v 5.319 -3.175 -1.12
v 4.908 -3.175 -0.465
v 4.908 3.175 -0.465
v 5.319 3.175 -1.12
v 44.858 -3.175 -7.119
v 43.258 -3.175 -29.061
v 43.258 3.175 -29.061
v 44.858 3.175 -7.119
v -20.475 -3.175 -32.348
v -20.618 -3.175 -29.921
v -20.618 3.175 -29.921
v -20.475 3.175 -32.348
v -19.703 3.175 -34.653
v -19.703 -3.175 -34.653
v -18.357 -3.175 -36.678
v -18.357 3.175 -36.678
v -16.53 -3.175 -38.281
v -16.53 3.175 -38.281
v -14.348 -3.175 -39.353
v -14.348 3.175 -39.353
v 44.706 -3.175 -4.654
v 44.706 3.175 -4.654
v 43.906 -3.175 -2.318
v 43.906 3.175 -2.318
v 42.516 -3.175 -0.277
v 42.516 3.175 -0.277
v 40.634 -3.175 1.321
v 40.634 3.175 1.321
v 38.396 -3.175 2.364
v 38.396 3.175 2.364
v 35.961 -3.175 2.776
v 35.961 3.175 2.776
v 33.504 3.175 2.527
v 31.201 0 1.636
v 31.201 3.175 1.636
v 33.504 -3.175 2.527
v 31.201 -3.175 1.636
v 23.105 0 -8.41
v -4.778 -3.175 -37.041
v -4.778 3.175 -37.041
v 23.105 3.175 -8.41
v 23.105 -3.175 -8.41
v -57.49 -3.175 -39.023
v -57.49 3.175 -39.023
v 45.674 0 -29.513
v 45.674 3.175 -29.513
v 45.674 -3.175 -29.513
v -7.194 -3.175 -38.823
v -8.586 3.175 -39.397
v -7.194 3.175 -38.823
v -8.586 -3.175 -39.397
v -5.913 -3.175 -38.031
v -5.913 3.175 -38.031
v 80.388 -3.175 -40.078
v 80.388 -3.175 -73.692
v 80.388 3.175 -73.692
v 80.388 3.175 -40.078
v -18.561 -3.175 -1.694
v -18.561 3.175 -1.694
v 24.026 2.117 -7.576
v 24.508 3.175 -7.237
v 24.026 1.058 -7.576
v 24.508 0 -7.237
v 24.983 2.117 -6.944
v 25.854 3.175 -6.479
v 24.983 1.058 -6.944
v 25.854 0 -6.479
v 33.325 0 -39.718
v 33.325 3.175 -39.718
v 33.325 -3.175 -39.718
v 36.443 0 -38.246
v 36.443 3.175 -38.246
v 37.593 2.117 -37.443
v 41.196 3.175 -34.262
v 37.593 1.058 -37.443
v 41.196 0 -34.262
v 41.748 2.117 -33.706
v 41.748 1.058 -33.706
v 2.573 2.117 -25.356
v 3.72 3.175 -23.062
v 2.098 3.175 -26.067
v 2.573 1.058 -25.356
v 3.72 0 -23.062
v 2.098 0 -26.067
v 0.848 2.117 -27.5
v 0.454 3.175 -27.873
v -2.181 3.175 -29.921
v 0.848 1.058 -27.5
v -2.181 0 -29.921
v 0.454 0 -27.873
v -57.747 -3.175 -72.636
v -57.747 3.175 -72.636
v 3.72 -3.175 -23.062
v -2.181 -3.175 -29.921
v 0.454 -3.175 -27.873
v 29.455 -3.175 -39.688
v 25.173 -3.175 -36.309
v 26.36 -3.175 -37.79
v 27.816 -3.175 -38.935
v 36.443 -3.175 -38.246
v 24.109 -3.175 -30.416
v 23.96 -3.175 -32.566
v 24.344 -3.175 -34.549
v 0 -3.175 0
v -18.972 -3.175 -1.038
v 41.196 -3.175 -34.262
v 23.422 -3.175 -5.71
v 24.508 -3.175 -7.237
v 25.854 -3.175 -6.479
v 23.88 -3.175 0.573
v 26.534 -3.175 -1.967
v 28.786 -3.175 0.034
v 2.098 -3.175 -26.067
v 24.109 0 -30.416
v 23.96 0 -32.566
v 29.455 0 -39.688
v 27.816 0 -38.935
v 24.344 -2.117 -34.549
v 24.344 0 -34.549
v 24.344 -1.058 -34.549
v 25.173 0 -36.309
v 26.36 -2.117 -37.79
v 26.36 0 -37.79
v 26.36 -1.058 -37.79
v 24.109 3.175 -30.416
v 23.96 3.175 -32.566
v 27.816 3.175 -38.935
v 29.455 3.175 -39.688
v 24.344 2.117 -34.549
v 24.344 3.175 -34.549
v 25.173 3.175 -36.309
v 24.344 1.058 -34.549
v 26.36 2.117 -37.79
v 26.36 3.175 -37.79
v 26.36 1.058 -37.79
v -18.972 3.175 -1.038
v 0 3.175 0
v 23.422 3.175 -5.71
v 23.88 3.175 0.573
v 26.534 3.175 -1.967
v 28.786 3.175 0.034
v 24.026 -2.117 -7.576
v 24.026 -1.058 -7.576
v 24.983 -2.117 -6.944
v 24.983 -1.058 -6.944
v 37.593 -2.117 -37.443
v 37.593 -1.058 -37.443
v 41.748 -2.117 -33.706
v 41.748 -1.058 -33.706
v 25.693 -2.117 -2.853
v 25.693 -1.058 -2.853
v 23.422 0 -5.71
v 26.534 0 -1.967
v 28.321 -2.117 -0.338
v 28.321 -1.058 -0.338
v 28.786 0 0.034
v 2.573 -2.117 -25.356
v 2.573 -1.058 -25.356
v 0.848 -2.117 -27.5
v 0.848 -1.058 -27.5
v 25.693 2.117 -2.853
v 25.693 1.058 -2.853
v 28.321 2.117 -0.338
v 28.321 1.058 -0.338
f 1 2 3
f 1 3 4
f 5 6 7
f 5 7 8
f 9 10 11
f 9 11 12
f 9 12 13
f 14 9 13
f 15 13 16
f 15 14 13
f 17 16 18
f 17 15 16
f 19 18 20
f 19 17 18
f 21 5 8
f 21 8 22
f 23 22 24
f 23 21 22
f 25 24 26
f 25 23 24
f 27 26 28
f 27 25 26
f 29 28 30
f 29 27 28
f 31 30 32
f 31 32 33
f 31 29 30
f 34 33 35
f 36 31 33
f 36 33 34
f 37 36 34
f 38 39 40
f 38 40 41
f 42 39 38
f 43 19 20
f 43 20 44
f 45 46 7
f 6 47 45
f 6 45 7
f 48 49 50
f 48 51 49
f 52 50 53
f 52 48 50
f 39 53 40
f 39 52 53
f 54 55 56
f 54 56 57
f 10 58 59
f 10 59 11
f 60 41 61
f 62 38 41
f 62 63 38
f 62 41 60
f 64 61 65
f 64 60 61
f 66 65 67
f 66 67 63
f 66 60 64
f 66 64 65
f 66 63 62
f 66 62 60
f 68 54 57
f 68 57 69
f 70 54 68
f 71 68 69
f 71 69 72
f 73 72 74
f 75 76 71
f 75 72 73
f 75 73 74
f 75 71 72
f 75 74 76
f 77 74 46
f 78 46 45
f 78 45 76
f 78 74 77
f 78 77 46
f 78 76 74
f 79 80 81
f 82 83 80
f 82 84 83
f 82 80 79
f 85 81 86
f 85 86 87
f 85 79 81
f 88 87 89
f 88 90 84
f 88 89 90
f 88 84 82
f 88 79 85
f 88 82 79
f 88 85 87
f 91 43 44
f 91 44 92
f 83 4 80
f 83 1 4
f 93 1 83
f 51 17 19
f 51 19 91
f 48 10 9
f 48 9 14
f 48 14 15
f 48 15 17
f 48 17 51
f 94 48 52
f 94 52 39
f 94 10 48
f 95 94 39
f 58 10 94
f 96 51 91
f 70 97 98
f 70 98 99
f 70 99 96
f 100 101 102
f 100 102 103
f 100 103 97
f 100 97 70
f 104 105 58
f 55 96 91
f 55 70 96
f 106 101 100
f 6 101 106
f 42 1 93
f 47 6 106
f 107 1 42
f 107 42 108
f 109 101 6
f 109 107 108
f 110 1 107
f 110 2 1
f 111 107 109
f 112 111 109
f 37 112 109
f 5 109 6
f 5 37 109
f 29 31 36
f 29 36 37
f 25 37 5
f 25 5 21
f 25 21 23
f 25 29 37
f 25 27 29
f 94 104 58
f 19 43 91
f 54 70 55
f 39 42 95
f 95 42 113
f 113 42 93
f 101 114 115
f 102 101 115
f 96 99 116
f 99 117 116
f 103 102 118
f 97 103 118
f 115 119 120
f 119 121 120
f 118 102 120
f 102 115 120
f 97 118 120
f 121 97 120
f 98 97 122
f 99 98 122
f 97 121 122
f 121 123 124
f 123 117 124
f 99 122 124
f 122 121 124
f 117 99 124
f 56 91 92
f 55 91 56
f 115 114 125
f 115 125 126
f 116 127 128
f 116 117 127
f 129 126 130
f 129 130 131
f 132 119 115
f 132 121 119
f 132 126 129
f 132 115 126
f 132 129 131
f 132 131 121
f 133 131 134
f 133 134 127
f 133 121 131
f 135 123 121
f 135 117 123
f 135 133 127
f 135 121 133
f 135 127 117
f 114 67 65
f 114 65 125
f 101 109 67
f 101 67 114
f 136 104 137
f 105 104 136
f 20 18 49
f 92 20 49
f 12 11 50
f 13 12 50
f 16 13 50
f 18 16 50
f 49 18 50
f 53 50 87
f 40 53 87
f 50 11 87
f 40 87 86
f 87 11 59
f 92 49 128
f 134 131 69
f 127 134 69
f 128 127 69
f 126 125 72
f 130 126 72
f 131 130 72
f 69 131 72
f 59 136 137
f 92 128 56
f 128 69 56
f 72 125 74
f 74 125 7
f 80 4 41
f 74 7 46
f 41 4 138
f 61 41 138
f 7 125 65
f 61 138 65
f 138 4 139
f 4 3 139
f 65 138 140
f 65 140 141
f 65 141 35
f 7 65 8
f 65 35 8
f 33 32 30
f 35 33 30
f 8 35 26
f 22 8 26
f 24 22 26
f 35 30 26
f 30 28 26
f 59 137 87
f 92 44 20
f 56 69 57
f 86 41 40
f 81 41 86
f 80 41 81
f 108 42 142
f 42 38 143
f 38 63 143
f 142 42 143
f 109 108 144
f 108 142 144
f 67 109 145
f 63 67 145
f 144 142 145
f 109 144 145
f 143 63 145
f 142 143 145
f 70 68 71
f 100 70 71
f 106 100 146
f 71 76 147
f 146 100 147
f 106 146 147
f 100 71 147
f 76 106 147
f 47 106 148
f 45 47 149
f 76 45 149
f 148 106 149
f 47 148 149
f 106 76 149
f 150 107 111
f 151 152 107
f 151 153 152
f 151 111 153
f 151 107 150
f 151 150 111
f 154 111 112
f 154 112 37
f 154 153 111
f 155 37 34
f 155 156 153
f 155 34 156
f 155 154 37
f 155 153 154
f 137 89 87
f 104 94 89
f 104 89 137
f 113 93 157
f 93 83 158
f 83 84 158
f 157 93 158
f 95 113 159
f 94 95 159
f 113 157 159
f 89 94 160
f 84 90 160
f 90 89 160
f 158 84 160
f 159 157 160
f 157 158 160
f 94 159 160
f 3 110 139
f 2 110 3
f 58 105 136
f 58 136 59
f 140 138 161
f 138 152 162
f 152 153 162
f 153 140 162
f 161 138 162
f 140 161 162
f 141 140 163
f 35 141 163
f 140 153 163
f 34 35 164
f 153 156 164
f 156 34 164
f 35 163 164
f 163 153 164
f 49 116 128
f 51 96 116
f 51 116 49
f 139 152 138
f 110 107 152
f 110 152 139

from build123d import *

# Parameters (mm, degrees)
F1_DEPTH = 3.175


with BuildPart() as f1:
    # F0 (on Front) → F1 (new body, symmetric)
    with BuildSketch(Plane.XZ):
        with BuildLine():
            Line((-2.1811367593, -29.9206056496), (0, 0))
            Line((0, 0), (-18.9716252415, -1.0379959996))
            Line((-18.9716252415, -1.0379959996), (-18.560718745, -1.6936484026))
            Line((-18.560718745, -1.6936484026), (-20.6183928033, -29.9206056496))
            ThreePointArc((-20.6183928033, -29.9206056496), (-19.097069056, -35.7098670599), (-14.3476168276, -39.3530356194))
            Line((-14.3476168276, -39.3530356194), (-8.5862497906, -39.3970988002))
            ThreePointArc((-8.5862497906, -39.3970988002), (-6.5372712865, -38.4533368755), (-4.7779318284, -37.0413439039))
            Line((-4.7779318284, -37.0413439039), (23.1049112899, -8.4100140946))
            add(Edge.make_bspline(
                [(23.1049112899, -8.4100140946), (23.9660870284, -7.4624572881), (25.0680023001, -6.8722019142), (25.8537740575, -6.4793160355)],
                knots=[0, 0, 0, 0, 3.3591429725, 3.3591429725, 3.3591429725, 3.3591429725], degree=3))
            Line((25.8537740575, -6.4793160355), (24.10886465, -30.4158005552))
            add(Edge.make_bspline(
                [(24.10886465, -30.4158005552), (23.221265172, -34.8448709212), (26.0528829358, -38.6121878233), (29.4550270257, -39.6880401081)],
                knots=[0, 0, 0, 0, 0.386502628, 0.386502628, 0.386502628, 0.386502628], degree=3))
            Line((29.4550270257, -39.6880401081), (33.3250212912, -39.7176379893))
            add(Edge.make_bspline(
                [(33.3250212912, -39.7176379893), (37.6104290116, -38.509658395), (41.9014469905, -33.599334096), (45.6744432449, -29.5126028359)],
                knots=[0.529238247, 0.529238247, 0.529238247, 0.529238247, 1, 1, 1, 1], degree=3))
            Line((45.6744432449, -29.5126028359), (43.2580737253, -29.0605745563))
            Line((43.2580737253, -29.0605745563), (44.8575740155, -7.1187970799))
            ThreePointArc((44.8575740155, -7.1187970799), (40.634142354, 1.3214875027), (31.2014035881, 1.6364767216))
            add(Edge.make_bspline(
                [(23.4220137692, -5.7100140946), (25.4793688655, -2.7494623791), (28.2295402139, 0), (31.2014035881, 1.6364767216)],
                knots=[0, 0, 0, 0, 10.6999922087, 10.6999922087, 10.6999922087, 10.6999922087], degree=3))
            Line((23.4220137692, -5.7100140946), (23.8800524886, 0.5733130918))
            Line((23.8800524886, 0.5733130918), (4.9084272471, -0.4646829078))
            Line((4.9084272471, -0.4646829078), (5.3193337437, -1.1203353108))
            Line((5.3193337437, -1.1203353108), (3.7198334535, -23.0621127871))
            add(Edge.make_bspline(
                [(3.7198334535, -23.0621127871), (2.6201102883, -25.5734715611), (1.7430323642, -27.2203981876), (-2.1811367593, -29.9206056496)],
                knots=[0, 0, 0, 0, 9.0476722861, 9.0476722861, 9.0476722861, 9.0476722861], degree=3))
        make_face()
        with BuildLine():
            Line((-8.5862497906, -39.3970988002), (-14.3476168276, -39.3530356194))
            ThreePointArc((-14.3476168276, -39.3530356194), (-11.4704542579, -39.8354397482), (-8.5862497906, -39.3970988002))
        make_face()
        with BuildLine():
            Line((33.3250212912, -39.7176379893), (29.4550270257, -39.6880401081))
            add(Edge.make_bspline(
                [(29.4550270257, -39.6880401081), (30.0021087518, -39.8610425176), (31.2924032253, -40.0985217153), (32.5914536336, -39.9244175584), (33.3250212912, -39.7176379893)],
                knots=[0.386502628, 0.386502628, 0.386502628, 0.386502628, 0.4486541769, 0.529238247, 0.529238247, 0.529238247, 0.529238247], degree=3))
        make_face()
        with BuildLine():
            ThreePointArc((-8.5862497906, -39.3970988002), (-11.4704542579, -39.8354397482), (-14.3476168276, -39.3530356194))
            Line((-14.3476168276, -39.3530356194), (-57.49016349, -39.0230795821))
            Line((-57.49016349, -39.0230795821), (-57.747233247, -72.6355695398))
            Line((-57.747233247, -72.6355695398), (80.3876109421, -73.6920307208))
            Line((80.3876109421, -73.6920307208), (80.3876109421, -40.0775746826))
            Line((80.3876109421, -40.0775746826), (33.3250212912, -39.7176379893))
            add(Edge.make_bspline(
                [(29.4550270257, -39.6880401081), (30.0021087518, -39.8610425176), (31.2924032253, -40.0985217153), (32.5914536336, -39.9244175584), (33.3250212912, -39.7176379893)],
                knots=[0.386502628, 0.386502628, 0.386502628, 0.386502628, 0.4486541769, 0.529238247, 0.529238247, 0.529238247, 0.529238247], degree=3))
            Line((29.4550270257, -39.6880401081), (-8.5862497906, -39.3970988002))
        make_face()
    extrude(amount=F1_DEPTH, both=True)


solid = f1.part
